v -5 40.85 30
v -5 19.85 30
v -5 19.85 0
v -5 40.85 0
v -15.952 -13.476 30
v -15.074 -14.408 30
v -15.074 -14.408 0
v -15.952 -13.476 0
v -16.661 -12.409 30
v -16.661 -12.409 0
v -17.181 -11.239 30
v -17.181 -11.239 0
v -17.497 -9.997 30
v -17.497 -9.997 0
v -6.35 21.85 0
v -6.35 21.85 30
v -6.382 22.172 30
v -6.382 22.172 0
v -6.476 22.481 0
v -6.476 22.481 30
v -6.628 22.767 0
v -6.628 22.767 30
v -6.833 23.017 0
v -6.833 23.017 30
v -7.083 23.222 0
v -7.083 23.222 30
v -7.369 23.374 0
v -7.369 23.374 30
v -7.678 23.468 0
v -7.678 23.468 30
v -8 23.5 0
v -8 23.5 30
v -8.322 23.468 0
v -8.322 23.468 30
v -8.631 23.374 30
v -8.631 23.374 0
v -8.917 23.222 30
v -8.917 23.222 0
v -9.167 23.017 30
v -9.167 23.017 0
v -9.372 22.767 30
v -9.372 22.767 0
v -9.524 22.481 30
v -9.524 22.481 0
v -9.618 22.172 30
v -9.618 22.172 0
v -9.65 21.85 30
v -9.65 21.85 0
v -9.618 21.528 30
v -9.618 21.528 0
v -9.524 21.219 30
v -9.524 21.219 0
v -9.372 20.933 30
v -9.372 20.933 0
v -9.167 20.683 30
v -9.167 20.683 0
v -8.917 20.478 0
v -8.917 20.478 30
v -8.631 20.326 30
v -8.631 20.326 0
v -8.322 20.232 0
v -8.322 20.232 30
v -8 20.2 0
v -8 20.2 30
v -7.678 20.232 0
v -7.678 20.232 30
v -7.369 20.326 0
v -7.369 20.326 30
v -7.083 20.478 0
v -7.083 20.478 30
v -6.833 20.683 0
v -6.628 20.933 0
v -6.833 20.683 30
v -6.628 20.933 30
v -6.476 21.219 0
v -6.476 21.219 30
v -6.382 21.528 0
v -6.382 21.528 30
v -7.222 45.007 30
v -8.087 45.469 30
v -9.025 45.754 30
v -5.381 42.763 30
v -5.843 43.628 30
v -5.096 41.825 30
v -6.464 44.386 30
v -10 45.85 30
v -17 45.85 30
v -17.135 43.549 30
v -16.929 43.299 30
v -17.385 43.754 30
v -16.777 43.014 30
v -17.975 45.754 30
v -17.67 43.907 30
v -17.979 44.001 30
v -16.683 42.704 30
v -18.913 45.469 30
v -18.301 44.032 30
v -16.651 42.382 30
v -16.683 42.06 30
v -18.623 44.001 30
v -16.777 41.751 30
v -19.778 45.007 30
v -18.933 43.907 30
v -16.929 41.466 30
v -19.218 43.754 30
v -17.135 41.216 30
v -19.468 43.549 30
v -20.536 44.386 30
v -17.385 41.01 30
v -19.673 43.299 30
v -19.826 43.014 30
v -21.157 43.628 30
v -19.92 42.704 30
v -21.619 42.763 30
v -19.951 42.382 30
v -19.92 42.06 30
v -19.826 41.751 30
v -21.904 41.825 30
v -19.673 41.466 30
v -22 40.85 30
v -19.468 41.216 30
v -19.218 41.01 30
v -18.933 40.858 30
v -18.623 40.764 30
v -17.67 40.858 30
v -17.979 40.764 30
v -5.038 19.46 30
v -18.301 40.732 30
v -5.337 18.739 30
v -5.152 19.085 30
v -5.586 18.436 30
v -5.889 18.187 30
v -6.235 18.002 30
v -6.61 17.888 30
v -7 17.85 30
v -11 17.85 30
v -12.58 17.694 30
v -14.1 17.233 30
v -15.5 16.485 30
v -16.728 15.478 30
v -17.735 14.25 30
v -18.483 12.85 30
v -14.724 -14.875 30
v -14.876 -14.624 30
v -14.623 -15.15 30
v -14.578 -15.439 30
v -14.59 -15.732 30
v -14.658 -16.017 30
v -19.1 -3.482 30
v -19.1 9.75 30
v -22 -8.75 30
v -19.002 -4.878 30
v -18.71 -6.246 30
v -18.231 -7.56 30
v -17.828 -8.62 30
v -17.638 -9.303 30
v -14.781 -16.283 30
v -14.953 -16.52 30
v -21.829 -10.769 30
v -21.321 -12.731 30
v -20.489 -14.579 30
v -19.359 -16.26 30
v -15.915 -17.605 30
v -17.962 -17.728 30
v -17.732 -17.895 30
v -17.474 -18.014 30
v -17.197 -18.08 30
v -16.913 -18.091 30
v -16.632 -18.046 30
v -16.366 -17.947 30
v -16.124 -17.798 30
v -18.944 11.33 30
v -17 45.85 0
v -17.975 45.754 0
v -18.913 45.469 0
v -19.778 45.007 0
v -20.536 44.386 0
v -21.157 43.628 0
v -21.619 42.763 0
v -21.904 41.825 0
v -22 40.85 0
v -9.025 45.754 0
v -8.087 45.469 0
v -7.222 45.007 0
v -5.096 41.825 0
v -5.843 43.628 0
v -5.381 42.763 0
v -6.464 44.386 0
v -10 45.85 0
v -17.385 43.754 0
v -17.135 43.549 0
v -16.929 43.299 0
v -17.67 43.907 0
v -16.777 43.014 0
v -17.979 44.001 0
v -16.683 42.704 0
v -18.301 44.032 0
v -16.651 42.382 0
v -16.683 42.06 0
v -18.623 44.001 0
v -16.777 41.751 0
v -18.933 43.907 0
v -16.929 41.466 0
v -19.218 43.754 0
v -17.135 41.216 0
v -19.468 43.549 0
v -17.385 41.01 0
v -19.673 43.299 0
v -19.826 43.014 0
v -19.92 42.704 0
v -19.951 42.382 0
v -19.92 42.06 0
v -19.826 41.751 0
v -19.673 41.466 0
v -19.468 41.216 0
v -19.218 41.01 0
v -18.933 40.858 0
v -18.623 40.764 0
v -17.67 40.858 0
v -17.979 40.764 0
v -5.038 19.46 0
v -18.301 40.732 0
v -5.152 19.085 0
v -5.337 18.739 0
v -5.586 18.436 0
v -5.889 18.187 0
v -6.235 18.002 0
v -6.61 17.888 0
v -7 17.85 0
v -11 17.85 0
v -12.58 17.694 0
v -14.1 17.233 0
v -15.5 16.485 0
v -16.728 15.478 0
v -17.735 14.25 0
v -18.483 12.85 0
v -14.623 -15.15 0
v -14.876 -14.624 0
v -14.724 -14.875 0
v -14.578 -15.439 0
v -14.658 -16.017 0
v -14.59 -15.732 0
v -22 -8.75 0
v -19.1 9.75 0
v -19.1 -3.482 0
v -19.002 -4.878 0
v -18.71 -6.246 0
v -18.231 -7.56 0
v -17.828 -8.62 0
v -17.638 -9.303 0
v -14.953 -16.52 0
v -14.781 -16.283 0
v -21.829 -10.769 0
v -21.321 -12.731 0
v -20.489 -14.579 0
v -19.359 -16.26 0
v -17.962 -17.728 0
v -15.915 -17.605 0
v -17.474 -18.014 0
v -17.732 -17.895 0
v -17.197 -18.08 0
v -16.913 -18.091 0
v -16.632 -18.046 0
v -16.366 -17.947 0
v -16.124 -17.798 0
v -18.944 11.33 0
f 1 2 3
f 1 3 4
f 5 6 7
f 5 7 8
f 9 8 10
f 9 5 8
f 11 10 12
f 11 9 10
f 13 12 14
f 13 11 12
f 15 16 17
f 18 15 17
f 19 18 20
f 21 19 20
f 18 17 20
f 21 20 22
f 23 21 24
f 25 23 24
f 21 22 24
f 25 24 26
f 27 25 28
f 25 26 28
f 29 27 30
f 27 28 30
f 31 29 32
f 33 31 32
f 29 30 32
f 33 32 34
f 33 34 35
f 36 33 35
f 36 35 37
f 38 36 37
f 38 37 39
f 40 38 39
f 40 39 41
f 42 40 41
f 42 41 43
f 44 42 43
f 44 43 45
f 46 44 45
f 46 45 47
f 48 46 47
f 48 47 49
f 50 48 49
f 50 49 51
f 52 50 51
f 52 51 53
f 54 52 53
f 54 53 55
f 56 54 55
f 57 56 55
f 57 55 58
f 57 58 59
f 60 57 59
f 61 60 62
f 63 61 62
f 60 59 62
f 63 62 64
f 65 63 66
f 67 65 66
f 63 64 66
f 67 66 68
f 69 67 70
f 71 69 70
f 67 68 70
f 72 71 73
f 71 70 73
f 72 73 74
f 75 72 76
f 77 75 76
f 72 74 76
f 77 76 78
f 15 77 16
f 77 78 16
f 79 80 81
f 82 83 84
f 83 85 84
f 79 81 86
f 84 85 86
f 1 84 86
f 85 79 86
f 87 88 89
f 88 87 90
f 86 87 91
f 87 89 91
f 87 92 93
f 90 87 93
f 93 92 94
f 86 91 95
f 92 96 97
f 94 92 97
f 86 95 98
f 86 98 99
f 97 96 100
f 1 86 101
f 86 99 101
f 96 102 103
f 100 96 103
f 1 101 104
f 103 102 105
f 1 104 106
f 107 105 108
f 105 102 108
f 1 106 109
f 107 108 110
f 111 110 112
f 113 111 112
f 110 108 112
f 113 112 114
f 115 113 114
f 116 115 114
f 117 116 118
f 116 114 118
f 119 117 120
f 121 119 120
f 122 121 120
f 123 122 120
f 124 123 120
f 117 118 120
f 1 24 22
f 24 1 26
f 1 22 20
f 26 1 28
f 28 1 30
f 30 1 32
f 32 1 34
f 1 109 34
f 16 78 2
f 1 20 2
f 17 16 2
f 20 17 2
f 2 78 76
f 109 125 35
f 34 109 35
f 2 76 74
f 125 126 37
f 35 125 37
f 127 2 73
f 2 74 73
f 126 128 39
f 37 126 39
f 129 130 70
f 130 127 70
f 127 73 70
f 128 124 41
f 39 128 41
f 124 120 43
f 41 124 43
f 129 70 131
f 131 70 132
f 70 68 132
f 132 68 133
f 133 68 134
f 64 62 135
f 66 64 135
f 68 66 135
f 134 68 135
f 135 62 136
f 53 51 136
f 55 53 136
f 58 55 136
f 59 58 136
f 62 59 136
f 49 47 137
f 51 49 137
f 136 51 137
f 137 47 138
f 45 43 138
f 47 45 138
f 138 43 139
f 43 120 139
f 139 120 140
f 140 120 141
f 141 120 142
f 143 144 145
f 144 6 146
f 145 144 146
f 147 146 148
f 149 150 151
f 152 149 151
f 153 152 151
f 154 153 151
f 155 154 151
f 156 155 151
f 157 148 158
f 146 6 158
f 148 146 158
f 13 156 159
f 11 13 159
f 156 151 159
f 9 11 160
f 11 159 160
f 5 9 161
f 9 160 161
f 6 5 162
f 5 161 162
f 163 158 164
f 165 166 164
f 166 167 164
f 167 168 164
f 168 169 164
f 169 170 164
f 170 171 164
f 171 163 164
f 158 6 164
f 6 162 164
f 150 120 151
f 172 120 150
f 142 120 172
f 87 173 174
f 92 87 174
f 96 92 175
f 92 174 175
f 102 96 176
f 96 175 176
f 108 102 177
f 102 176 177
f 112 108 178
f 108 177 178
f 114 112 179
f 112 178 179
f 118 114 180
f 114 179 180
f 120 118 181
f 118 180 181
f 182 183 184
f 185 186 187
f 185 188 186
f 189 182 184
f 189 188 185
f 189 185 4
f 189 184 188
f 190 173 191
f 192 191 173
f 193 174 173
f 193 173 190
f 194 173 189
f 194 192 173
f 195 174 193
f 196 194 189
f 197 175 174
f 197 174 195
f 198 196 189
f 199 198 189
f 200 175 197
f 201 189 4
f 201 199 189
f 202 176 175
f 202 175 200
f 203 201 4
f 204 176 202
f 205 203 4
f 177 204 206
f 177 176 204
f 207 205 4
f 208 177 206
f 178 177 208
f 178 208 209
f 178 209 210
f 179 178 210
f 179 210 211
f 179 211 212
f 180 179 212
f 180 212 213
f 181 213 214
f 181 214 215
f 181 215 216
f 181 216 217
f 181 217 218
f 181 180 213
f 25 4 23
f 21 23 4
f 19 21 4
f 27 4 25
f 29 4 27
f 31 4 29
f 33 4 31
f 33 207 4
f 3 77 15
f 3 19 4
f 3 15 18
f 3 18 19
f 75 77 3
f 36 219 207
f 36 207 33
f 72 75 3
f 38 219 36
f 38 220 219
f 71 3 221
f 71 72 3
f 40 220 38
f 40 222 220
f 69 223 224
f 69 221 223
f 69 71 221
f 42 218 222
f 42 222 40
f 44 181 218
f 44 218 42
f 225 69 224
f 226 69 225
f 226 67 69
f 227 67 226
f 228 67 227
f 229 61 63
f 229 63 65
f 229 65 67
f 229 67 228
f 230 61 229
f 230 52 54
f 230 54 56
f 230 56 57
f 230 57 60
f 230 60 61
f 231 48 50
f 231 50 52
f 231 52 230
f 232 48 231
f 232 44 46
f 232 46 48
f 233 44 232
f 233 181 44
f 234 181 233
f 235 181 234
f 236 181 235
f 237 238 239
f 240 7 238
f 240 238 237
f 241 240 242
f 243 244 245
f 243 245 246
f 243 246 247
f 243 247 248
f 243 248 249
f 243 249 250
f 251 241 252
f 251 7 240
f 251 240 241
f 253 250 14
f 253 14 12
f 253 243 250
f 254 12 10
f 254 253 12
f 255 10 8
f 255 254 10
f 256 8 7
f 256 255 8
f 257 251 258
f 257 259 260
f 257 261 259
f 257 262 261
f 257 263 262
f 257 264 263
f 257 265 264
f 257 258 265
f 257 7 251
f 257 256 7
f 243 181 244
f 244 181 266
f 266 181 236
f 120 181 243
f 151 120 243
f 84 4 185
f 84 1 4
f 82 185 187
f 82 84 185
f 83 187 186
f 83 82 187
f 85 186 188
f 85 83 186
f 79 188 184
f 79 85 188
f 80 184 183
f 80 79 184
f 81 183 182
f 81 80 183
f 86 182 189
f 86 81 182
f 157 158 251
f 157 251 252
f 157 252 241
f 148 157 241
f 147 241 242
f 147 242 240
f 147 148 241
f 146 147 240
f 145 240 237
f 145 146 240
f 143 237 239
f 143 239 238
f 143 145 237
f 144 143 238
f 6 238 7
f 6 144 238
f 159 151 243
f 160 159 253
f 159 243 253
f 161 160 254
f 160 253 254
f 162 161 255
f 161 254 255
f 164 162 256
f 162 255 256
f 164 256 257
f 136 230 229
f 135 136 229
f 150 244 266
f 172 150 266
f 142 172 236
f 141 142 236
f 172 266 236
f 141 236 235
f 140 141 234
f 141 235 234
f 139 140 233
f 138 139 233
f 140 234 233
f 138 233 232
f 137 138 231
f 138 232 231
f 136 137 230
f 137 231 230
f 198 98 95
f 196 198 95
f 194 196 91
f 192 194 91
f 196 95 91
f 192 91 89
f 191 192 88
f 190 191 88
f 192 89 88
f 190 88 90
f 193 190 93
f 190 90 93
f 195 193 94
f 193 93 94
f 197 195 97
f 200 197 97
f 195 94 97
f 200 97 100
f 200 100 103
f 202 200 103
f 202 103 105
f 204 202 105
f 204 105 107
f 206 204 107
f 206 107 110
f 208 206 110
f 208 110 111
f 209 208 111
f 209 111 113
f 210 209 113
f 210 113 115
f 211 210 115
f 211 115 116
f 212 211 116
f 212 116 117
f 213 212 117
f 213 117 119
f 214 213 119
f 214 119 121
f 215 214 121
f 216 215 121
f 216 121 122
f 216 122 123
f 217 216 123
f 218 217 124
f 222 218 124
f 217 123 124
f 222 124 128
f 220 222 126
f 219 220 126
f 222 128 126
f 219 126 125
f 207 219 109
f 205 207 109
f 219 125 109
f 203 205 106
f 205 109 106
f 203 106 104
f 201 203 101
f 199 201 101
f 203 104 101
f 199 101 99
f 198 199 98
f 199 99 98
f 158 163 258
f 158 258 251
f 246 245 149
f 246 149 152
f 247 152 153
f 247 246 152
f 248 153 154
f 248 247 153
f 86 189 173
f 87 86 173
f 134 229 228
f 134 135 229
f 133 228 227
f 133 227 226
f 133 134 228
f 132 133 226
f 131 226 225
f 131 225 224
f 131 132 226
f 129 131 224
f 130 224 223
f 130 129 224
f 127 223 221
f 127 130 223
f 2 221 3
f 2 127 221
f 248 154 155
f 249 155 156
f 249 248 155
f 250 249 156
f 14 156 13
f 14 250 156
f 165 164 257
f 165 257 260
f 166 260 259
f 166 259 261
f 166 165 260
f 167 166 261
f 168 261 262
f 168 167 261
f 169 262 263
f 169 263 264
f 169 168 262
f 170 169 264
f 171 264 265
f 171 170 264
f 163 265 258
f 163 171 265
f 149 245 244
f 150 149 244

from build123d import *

# Parameters (mm, degrees)
EXTRUDE_1_DEPTH     = 30
CUT_EXTRUDE_2_DEPTH = 60.044241887
EXTRUDE_2_DEPTH     = 30
FILLET_2_R          = 10
FILLET_3_R          = 10
SKETCH_6_R          = 1.65
CUT_EXTRUDE_3_DEPTH = 60.044242053
FILLET_4_R          = 2
FILLET_6_R          = 5


with BuildPart() as part:
    # 草图2 → 凸台-拉伸1 (new body)
    with BuildSketch(Plane.XY):
        with BuildLine():
            Line((-22, 40.85), (-22, -8.75))
            ThreePointArc((-22, -8.75), (-18.485281374, -17.235281374), (-10, -20.75))
            Line((-10, -20.75), (-10, -17.85))
            ThreePointArc((-10, -17.85), (-16.434671709, -15.184671709), (-19.1, -8.75))
            Line((-19.1, -8.75), (-19.1, 9.75))
            ThreePointArc((-19.1, 9.75), (-16.727564928, 15.477564928), (-11, 17.85))
            Line((-11, 17.85), (-5, 17.85))
            Line((-5, 17.85), (-5, 45.85))
            Line((-5, 45.85), (-17, 45.85))
            ThreePointArc((-17, 45.85), (-20.535533906, 44.385533906), (-22, 40.85))
        make_face()
    extrude(amount=EXTRUDE_1_DEPTH)

    # 草图4 → 切除-拉伸2 (cut, through all)
    with BuildSketch(Plane.XY.offset(30)):
        with BuildLine():
            Line((-10, -17.85), (-10, -20.75))
            ThreePointArc((-10, -20.75), (-14.258140623, -19.969101498), (-17.962085308, -17.728039739))
            ThreePointArc((-17.962085308, -17.728039739), (-15.915153532, -17.605278578), (-16.037914692, -15.558346802))
            ThreePointArc((-16.037914692, -15.558346802), (-13.229089973, -17.257818636), (-10, -17.85))
        make_face()
    extrude(amount=-CUT_EXTRUDE_2_DEPTH, mode=Mode.SUBTRACT)

    # 草图5 → 凸台-拉伸2 (add, through all)
    with BuildSketch(Plane.XY.offset(30)):
        with BuildLine():
            Line((-17.6, -8.75), (-19.1, -8.75))
            Line((-19.1, -8.75), (-19.1, -14.554532695))
            Line((-19.1, -14.554532695), (-15.915153532, -17.605278578))
            Line((-15.915153532, -17.605278578), (-14.952977082, -16.520329338))
            ThreePointArc((-14.952977082, -16.520329338), (-14.577681338, -15.439383984), (-15.073820173, -14.408299113))
            ThreePointArc((-15.073820173, -14.408299113), (-16.939777854, -11.848303301), (-17.6, -8.75))
        make_face()
    extrude(amount=-EXTRUDE_2_DEPTH)

    # 圆角2
    # the kernel refuses this fillet: 10 mm, written as the material it adds along each edge
    with BuildSketch(Plane(origin=(-19.1, -8.75, 0), x_dir=(0, 1, 0), z_dir=(0, 0, 1))) as fillet_2_piece_1:
        with BuildLine():
            CenterArc((5.267826876, -10), FILLET_2_R, 90, 31.788330617)
            Line((0, -1.5), (-0.105356538, -1.33))
            ThreePointArc((-0.105356538, -1.33), (-0.2, -0.75), (-0.2, 0))
            Line((-0.2, 0), (0, 0.2))
            Line((0, 0.2), (5.267826876, 0.2))
            Line((5.267826876, 0.2), (5.267826876, 0))
        make_face()
    extrude(amount=30)

    # 圆角3
    fillet_3_edges = [part.edges().sort_by_distance(p)[0] for p in [
        (-17.6, -8.75, 15),
    ]]
    fillet(fillet_3_edges, radius=FILLET_3_R)

    # 草图6 → 切除-拉伸3 (cut, through all)
    with BuildSketch(Plane.XY.offset(30)):
        with Locations((-8, 21.85)):
            Circle(SKETCH_6_R)
        with Locations((-18.301374289, 42.382296182)):
            Circle(SKETCH_6_R)
    extrude(amount=-CUT_EXTRUDE_3_DEPTH, mode=Mode.SUBTRACT)

    # 圆角4
    fillet_4_edges = [part.edges().sort_by_distance(p)[0] for p in [
        (-5, 17.85, 15),
    ]]
    fillet(fillet_4_edges, radius=FILLET_4_R)

    # 圆角6
    fillet_6_edges = [part.edges().sort_by_distance(p)[0] for p in [
        (-5, 45.85, 15),
    ]]
    fillet(fillet_6_edges, radius=FILLET_6_R)


solid = part.part
